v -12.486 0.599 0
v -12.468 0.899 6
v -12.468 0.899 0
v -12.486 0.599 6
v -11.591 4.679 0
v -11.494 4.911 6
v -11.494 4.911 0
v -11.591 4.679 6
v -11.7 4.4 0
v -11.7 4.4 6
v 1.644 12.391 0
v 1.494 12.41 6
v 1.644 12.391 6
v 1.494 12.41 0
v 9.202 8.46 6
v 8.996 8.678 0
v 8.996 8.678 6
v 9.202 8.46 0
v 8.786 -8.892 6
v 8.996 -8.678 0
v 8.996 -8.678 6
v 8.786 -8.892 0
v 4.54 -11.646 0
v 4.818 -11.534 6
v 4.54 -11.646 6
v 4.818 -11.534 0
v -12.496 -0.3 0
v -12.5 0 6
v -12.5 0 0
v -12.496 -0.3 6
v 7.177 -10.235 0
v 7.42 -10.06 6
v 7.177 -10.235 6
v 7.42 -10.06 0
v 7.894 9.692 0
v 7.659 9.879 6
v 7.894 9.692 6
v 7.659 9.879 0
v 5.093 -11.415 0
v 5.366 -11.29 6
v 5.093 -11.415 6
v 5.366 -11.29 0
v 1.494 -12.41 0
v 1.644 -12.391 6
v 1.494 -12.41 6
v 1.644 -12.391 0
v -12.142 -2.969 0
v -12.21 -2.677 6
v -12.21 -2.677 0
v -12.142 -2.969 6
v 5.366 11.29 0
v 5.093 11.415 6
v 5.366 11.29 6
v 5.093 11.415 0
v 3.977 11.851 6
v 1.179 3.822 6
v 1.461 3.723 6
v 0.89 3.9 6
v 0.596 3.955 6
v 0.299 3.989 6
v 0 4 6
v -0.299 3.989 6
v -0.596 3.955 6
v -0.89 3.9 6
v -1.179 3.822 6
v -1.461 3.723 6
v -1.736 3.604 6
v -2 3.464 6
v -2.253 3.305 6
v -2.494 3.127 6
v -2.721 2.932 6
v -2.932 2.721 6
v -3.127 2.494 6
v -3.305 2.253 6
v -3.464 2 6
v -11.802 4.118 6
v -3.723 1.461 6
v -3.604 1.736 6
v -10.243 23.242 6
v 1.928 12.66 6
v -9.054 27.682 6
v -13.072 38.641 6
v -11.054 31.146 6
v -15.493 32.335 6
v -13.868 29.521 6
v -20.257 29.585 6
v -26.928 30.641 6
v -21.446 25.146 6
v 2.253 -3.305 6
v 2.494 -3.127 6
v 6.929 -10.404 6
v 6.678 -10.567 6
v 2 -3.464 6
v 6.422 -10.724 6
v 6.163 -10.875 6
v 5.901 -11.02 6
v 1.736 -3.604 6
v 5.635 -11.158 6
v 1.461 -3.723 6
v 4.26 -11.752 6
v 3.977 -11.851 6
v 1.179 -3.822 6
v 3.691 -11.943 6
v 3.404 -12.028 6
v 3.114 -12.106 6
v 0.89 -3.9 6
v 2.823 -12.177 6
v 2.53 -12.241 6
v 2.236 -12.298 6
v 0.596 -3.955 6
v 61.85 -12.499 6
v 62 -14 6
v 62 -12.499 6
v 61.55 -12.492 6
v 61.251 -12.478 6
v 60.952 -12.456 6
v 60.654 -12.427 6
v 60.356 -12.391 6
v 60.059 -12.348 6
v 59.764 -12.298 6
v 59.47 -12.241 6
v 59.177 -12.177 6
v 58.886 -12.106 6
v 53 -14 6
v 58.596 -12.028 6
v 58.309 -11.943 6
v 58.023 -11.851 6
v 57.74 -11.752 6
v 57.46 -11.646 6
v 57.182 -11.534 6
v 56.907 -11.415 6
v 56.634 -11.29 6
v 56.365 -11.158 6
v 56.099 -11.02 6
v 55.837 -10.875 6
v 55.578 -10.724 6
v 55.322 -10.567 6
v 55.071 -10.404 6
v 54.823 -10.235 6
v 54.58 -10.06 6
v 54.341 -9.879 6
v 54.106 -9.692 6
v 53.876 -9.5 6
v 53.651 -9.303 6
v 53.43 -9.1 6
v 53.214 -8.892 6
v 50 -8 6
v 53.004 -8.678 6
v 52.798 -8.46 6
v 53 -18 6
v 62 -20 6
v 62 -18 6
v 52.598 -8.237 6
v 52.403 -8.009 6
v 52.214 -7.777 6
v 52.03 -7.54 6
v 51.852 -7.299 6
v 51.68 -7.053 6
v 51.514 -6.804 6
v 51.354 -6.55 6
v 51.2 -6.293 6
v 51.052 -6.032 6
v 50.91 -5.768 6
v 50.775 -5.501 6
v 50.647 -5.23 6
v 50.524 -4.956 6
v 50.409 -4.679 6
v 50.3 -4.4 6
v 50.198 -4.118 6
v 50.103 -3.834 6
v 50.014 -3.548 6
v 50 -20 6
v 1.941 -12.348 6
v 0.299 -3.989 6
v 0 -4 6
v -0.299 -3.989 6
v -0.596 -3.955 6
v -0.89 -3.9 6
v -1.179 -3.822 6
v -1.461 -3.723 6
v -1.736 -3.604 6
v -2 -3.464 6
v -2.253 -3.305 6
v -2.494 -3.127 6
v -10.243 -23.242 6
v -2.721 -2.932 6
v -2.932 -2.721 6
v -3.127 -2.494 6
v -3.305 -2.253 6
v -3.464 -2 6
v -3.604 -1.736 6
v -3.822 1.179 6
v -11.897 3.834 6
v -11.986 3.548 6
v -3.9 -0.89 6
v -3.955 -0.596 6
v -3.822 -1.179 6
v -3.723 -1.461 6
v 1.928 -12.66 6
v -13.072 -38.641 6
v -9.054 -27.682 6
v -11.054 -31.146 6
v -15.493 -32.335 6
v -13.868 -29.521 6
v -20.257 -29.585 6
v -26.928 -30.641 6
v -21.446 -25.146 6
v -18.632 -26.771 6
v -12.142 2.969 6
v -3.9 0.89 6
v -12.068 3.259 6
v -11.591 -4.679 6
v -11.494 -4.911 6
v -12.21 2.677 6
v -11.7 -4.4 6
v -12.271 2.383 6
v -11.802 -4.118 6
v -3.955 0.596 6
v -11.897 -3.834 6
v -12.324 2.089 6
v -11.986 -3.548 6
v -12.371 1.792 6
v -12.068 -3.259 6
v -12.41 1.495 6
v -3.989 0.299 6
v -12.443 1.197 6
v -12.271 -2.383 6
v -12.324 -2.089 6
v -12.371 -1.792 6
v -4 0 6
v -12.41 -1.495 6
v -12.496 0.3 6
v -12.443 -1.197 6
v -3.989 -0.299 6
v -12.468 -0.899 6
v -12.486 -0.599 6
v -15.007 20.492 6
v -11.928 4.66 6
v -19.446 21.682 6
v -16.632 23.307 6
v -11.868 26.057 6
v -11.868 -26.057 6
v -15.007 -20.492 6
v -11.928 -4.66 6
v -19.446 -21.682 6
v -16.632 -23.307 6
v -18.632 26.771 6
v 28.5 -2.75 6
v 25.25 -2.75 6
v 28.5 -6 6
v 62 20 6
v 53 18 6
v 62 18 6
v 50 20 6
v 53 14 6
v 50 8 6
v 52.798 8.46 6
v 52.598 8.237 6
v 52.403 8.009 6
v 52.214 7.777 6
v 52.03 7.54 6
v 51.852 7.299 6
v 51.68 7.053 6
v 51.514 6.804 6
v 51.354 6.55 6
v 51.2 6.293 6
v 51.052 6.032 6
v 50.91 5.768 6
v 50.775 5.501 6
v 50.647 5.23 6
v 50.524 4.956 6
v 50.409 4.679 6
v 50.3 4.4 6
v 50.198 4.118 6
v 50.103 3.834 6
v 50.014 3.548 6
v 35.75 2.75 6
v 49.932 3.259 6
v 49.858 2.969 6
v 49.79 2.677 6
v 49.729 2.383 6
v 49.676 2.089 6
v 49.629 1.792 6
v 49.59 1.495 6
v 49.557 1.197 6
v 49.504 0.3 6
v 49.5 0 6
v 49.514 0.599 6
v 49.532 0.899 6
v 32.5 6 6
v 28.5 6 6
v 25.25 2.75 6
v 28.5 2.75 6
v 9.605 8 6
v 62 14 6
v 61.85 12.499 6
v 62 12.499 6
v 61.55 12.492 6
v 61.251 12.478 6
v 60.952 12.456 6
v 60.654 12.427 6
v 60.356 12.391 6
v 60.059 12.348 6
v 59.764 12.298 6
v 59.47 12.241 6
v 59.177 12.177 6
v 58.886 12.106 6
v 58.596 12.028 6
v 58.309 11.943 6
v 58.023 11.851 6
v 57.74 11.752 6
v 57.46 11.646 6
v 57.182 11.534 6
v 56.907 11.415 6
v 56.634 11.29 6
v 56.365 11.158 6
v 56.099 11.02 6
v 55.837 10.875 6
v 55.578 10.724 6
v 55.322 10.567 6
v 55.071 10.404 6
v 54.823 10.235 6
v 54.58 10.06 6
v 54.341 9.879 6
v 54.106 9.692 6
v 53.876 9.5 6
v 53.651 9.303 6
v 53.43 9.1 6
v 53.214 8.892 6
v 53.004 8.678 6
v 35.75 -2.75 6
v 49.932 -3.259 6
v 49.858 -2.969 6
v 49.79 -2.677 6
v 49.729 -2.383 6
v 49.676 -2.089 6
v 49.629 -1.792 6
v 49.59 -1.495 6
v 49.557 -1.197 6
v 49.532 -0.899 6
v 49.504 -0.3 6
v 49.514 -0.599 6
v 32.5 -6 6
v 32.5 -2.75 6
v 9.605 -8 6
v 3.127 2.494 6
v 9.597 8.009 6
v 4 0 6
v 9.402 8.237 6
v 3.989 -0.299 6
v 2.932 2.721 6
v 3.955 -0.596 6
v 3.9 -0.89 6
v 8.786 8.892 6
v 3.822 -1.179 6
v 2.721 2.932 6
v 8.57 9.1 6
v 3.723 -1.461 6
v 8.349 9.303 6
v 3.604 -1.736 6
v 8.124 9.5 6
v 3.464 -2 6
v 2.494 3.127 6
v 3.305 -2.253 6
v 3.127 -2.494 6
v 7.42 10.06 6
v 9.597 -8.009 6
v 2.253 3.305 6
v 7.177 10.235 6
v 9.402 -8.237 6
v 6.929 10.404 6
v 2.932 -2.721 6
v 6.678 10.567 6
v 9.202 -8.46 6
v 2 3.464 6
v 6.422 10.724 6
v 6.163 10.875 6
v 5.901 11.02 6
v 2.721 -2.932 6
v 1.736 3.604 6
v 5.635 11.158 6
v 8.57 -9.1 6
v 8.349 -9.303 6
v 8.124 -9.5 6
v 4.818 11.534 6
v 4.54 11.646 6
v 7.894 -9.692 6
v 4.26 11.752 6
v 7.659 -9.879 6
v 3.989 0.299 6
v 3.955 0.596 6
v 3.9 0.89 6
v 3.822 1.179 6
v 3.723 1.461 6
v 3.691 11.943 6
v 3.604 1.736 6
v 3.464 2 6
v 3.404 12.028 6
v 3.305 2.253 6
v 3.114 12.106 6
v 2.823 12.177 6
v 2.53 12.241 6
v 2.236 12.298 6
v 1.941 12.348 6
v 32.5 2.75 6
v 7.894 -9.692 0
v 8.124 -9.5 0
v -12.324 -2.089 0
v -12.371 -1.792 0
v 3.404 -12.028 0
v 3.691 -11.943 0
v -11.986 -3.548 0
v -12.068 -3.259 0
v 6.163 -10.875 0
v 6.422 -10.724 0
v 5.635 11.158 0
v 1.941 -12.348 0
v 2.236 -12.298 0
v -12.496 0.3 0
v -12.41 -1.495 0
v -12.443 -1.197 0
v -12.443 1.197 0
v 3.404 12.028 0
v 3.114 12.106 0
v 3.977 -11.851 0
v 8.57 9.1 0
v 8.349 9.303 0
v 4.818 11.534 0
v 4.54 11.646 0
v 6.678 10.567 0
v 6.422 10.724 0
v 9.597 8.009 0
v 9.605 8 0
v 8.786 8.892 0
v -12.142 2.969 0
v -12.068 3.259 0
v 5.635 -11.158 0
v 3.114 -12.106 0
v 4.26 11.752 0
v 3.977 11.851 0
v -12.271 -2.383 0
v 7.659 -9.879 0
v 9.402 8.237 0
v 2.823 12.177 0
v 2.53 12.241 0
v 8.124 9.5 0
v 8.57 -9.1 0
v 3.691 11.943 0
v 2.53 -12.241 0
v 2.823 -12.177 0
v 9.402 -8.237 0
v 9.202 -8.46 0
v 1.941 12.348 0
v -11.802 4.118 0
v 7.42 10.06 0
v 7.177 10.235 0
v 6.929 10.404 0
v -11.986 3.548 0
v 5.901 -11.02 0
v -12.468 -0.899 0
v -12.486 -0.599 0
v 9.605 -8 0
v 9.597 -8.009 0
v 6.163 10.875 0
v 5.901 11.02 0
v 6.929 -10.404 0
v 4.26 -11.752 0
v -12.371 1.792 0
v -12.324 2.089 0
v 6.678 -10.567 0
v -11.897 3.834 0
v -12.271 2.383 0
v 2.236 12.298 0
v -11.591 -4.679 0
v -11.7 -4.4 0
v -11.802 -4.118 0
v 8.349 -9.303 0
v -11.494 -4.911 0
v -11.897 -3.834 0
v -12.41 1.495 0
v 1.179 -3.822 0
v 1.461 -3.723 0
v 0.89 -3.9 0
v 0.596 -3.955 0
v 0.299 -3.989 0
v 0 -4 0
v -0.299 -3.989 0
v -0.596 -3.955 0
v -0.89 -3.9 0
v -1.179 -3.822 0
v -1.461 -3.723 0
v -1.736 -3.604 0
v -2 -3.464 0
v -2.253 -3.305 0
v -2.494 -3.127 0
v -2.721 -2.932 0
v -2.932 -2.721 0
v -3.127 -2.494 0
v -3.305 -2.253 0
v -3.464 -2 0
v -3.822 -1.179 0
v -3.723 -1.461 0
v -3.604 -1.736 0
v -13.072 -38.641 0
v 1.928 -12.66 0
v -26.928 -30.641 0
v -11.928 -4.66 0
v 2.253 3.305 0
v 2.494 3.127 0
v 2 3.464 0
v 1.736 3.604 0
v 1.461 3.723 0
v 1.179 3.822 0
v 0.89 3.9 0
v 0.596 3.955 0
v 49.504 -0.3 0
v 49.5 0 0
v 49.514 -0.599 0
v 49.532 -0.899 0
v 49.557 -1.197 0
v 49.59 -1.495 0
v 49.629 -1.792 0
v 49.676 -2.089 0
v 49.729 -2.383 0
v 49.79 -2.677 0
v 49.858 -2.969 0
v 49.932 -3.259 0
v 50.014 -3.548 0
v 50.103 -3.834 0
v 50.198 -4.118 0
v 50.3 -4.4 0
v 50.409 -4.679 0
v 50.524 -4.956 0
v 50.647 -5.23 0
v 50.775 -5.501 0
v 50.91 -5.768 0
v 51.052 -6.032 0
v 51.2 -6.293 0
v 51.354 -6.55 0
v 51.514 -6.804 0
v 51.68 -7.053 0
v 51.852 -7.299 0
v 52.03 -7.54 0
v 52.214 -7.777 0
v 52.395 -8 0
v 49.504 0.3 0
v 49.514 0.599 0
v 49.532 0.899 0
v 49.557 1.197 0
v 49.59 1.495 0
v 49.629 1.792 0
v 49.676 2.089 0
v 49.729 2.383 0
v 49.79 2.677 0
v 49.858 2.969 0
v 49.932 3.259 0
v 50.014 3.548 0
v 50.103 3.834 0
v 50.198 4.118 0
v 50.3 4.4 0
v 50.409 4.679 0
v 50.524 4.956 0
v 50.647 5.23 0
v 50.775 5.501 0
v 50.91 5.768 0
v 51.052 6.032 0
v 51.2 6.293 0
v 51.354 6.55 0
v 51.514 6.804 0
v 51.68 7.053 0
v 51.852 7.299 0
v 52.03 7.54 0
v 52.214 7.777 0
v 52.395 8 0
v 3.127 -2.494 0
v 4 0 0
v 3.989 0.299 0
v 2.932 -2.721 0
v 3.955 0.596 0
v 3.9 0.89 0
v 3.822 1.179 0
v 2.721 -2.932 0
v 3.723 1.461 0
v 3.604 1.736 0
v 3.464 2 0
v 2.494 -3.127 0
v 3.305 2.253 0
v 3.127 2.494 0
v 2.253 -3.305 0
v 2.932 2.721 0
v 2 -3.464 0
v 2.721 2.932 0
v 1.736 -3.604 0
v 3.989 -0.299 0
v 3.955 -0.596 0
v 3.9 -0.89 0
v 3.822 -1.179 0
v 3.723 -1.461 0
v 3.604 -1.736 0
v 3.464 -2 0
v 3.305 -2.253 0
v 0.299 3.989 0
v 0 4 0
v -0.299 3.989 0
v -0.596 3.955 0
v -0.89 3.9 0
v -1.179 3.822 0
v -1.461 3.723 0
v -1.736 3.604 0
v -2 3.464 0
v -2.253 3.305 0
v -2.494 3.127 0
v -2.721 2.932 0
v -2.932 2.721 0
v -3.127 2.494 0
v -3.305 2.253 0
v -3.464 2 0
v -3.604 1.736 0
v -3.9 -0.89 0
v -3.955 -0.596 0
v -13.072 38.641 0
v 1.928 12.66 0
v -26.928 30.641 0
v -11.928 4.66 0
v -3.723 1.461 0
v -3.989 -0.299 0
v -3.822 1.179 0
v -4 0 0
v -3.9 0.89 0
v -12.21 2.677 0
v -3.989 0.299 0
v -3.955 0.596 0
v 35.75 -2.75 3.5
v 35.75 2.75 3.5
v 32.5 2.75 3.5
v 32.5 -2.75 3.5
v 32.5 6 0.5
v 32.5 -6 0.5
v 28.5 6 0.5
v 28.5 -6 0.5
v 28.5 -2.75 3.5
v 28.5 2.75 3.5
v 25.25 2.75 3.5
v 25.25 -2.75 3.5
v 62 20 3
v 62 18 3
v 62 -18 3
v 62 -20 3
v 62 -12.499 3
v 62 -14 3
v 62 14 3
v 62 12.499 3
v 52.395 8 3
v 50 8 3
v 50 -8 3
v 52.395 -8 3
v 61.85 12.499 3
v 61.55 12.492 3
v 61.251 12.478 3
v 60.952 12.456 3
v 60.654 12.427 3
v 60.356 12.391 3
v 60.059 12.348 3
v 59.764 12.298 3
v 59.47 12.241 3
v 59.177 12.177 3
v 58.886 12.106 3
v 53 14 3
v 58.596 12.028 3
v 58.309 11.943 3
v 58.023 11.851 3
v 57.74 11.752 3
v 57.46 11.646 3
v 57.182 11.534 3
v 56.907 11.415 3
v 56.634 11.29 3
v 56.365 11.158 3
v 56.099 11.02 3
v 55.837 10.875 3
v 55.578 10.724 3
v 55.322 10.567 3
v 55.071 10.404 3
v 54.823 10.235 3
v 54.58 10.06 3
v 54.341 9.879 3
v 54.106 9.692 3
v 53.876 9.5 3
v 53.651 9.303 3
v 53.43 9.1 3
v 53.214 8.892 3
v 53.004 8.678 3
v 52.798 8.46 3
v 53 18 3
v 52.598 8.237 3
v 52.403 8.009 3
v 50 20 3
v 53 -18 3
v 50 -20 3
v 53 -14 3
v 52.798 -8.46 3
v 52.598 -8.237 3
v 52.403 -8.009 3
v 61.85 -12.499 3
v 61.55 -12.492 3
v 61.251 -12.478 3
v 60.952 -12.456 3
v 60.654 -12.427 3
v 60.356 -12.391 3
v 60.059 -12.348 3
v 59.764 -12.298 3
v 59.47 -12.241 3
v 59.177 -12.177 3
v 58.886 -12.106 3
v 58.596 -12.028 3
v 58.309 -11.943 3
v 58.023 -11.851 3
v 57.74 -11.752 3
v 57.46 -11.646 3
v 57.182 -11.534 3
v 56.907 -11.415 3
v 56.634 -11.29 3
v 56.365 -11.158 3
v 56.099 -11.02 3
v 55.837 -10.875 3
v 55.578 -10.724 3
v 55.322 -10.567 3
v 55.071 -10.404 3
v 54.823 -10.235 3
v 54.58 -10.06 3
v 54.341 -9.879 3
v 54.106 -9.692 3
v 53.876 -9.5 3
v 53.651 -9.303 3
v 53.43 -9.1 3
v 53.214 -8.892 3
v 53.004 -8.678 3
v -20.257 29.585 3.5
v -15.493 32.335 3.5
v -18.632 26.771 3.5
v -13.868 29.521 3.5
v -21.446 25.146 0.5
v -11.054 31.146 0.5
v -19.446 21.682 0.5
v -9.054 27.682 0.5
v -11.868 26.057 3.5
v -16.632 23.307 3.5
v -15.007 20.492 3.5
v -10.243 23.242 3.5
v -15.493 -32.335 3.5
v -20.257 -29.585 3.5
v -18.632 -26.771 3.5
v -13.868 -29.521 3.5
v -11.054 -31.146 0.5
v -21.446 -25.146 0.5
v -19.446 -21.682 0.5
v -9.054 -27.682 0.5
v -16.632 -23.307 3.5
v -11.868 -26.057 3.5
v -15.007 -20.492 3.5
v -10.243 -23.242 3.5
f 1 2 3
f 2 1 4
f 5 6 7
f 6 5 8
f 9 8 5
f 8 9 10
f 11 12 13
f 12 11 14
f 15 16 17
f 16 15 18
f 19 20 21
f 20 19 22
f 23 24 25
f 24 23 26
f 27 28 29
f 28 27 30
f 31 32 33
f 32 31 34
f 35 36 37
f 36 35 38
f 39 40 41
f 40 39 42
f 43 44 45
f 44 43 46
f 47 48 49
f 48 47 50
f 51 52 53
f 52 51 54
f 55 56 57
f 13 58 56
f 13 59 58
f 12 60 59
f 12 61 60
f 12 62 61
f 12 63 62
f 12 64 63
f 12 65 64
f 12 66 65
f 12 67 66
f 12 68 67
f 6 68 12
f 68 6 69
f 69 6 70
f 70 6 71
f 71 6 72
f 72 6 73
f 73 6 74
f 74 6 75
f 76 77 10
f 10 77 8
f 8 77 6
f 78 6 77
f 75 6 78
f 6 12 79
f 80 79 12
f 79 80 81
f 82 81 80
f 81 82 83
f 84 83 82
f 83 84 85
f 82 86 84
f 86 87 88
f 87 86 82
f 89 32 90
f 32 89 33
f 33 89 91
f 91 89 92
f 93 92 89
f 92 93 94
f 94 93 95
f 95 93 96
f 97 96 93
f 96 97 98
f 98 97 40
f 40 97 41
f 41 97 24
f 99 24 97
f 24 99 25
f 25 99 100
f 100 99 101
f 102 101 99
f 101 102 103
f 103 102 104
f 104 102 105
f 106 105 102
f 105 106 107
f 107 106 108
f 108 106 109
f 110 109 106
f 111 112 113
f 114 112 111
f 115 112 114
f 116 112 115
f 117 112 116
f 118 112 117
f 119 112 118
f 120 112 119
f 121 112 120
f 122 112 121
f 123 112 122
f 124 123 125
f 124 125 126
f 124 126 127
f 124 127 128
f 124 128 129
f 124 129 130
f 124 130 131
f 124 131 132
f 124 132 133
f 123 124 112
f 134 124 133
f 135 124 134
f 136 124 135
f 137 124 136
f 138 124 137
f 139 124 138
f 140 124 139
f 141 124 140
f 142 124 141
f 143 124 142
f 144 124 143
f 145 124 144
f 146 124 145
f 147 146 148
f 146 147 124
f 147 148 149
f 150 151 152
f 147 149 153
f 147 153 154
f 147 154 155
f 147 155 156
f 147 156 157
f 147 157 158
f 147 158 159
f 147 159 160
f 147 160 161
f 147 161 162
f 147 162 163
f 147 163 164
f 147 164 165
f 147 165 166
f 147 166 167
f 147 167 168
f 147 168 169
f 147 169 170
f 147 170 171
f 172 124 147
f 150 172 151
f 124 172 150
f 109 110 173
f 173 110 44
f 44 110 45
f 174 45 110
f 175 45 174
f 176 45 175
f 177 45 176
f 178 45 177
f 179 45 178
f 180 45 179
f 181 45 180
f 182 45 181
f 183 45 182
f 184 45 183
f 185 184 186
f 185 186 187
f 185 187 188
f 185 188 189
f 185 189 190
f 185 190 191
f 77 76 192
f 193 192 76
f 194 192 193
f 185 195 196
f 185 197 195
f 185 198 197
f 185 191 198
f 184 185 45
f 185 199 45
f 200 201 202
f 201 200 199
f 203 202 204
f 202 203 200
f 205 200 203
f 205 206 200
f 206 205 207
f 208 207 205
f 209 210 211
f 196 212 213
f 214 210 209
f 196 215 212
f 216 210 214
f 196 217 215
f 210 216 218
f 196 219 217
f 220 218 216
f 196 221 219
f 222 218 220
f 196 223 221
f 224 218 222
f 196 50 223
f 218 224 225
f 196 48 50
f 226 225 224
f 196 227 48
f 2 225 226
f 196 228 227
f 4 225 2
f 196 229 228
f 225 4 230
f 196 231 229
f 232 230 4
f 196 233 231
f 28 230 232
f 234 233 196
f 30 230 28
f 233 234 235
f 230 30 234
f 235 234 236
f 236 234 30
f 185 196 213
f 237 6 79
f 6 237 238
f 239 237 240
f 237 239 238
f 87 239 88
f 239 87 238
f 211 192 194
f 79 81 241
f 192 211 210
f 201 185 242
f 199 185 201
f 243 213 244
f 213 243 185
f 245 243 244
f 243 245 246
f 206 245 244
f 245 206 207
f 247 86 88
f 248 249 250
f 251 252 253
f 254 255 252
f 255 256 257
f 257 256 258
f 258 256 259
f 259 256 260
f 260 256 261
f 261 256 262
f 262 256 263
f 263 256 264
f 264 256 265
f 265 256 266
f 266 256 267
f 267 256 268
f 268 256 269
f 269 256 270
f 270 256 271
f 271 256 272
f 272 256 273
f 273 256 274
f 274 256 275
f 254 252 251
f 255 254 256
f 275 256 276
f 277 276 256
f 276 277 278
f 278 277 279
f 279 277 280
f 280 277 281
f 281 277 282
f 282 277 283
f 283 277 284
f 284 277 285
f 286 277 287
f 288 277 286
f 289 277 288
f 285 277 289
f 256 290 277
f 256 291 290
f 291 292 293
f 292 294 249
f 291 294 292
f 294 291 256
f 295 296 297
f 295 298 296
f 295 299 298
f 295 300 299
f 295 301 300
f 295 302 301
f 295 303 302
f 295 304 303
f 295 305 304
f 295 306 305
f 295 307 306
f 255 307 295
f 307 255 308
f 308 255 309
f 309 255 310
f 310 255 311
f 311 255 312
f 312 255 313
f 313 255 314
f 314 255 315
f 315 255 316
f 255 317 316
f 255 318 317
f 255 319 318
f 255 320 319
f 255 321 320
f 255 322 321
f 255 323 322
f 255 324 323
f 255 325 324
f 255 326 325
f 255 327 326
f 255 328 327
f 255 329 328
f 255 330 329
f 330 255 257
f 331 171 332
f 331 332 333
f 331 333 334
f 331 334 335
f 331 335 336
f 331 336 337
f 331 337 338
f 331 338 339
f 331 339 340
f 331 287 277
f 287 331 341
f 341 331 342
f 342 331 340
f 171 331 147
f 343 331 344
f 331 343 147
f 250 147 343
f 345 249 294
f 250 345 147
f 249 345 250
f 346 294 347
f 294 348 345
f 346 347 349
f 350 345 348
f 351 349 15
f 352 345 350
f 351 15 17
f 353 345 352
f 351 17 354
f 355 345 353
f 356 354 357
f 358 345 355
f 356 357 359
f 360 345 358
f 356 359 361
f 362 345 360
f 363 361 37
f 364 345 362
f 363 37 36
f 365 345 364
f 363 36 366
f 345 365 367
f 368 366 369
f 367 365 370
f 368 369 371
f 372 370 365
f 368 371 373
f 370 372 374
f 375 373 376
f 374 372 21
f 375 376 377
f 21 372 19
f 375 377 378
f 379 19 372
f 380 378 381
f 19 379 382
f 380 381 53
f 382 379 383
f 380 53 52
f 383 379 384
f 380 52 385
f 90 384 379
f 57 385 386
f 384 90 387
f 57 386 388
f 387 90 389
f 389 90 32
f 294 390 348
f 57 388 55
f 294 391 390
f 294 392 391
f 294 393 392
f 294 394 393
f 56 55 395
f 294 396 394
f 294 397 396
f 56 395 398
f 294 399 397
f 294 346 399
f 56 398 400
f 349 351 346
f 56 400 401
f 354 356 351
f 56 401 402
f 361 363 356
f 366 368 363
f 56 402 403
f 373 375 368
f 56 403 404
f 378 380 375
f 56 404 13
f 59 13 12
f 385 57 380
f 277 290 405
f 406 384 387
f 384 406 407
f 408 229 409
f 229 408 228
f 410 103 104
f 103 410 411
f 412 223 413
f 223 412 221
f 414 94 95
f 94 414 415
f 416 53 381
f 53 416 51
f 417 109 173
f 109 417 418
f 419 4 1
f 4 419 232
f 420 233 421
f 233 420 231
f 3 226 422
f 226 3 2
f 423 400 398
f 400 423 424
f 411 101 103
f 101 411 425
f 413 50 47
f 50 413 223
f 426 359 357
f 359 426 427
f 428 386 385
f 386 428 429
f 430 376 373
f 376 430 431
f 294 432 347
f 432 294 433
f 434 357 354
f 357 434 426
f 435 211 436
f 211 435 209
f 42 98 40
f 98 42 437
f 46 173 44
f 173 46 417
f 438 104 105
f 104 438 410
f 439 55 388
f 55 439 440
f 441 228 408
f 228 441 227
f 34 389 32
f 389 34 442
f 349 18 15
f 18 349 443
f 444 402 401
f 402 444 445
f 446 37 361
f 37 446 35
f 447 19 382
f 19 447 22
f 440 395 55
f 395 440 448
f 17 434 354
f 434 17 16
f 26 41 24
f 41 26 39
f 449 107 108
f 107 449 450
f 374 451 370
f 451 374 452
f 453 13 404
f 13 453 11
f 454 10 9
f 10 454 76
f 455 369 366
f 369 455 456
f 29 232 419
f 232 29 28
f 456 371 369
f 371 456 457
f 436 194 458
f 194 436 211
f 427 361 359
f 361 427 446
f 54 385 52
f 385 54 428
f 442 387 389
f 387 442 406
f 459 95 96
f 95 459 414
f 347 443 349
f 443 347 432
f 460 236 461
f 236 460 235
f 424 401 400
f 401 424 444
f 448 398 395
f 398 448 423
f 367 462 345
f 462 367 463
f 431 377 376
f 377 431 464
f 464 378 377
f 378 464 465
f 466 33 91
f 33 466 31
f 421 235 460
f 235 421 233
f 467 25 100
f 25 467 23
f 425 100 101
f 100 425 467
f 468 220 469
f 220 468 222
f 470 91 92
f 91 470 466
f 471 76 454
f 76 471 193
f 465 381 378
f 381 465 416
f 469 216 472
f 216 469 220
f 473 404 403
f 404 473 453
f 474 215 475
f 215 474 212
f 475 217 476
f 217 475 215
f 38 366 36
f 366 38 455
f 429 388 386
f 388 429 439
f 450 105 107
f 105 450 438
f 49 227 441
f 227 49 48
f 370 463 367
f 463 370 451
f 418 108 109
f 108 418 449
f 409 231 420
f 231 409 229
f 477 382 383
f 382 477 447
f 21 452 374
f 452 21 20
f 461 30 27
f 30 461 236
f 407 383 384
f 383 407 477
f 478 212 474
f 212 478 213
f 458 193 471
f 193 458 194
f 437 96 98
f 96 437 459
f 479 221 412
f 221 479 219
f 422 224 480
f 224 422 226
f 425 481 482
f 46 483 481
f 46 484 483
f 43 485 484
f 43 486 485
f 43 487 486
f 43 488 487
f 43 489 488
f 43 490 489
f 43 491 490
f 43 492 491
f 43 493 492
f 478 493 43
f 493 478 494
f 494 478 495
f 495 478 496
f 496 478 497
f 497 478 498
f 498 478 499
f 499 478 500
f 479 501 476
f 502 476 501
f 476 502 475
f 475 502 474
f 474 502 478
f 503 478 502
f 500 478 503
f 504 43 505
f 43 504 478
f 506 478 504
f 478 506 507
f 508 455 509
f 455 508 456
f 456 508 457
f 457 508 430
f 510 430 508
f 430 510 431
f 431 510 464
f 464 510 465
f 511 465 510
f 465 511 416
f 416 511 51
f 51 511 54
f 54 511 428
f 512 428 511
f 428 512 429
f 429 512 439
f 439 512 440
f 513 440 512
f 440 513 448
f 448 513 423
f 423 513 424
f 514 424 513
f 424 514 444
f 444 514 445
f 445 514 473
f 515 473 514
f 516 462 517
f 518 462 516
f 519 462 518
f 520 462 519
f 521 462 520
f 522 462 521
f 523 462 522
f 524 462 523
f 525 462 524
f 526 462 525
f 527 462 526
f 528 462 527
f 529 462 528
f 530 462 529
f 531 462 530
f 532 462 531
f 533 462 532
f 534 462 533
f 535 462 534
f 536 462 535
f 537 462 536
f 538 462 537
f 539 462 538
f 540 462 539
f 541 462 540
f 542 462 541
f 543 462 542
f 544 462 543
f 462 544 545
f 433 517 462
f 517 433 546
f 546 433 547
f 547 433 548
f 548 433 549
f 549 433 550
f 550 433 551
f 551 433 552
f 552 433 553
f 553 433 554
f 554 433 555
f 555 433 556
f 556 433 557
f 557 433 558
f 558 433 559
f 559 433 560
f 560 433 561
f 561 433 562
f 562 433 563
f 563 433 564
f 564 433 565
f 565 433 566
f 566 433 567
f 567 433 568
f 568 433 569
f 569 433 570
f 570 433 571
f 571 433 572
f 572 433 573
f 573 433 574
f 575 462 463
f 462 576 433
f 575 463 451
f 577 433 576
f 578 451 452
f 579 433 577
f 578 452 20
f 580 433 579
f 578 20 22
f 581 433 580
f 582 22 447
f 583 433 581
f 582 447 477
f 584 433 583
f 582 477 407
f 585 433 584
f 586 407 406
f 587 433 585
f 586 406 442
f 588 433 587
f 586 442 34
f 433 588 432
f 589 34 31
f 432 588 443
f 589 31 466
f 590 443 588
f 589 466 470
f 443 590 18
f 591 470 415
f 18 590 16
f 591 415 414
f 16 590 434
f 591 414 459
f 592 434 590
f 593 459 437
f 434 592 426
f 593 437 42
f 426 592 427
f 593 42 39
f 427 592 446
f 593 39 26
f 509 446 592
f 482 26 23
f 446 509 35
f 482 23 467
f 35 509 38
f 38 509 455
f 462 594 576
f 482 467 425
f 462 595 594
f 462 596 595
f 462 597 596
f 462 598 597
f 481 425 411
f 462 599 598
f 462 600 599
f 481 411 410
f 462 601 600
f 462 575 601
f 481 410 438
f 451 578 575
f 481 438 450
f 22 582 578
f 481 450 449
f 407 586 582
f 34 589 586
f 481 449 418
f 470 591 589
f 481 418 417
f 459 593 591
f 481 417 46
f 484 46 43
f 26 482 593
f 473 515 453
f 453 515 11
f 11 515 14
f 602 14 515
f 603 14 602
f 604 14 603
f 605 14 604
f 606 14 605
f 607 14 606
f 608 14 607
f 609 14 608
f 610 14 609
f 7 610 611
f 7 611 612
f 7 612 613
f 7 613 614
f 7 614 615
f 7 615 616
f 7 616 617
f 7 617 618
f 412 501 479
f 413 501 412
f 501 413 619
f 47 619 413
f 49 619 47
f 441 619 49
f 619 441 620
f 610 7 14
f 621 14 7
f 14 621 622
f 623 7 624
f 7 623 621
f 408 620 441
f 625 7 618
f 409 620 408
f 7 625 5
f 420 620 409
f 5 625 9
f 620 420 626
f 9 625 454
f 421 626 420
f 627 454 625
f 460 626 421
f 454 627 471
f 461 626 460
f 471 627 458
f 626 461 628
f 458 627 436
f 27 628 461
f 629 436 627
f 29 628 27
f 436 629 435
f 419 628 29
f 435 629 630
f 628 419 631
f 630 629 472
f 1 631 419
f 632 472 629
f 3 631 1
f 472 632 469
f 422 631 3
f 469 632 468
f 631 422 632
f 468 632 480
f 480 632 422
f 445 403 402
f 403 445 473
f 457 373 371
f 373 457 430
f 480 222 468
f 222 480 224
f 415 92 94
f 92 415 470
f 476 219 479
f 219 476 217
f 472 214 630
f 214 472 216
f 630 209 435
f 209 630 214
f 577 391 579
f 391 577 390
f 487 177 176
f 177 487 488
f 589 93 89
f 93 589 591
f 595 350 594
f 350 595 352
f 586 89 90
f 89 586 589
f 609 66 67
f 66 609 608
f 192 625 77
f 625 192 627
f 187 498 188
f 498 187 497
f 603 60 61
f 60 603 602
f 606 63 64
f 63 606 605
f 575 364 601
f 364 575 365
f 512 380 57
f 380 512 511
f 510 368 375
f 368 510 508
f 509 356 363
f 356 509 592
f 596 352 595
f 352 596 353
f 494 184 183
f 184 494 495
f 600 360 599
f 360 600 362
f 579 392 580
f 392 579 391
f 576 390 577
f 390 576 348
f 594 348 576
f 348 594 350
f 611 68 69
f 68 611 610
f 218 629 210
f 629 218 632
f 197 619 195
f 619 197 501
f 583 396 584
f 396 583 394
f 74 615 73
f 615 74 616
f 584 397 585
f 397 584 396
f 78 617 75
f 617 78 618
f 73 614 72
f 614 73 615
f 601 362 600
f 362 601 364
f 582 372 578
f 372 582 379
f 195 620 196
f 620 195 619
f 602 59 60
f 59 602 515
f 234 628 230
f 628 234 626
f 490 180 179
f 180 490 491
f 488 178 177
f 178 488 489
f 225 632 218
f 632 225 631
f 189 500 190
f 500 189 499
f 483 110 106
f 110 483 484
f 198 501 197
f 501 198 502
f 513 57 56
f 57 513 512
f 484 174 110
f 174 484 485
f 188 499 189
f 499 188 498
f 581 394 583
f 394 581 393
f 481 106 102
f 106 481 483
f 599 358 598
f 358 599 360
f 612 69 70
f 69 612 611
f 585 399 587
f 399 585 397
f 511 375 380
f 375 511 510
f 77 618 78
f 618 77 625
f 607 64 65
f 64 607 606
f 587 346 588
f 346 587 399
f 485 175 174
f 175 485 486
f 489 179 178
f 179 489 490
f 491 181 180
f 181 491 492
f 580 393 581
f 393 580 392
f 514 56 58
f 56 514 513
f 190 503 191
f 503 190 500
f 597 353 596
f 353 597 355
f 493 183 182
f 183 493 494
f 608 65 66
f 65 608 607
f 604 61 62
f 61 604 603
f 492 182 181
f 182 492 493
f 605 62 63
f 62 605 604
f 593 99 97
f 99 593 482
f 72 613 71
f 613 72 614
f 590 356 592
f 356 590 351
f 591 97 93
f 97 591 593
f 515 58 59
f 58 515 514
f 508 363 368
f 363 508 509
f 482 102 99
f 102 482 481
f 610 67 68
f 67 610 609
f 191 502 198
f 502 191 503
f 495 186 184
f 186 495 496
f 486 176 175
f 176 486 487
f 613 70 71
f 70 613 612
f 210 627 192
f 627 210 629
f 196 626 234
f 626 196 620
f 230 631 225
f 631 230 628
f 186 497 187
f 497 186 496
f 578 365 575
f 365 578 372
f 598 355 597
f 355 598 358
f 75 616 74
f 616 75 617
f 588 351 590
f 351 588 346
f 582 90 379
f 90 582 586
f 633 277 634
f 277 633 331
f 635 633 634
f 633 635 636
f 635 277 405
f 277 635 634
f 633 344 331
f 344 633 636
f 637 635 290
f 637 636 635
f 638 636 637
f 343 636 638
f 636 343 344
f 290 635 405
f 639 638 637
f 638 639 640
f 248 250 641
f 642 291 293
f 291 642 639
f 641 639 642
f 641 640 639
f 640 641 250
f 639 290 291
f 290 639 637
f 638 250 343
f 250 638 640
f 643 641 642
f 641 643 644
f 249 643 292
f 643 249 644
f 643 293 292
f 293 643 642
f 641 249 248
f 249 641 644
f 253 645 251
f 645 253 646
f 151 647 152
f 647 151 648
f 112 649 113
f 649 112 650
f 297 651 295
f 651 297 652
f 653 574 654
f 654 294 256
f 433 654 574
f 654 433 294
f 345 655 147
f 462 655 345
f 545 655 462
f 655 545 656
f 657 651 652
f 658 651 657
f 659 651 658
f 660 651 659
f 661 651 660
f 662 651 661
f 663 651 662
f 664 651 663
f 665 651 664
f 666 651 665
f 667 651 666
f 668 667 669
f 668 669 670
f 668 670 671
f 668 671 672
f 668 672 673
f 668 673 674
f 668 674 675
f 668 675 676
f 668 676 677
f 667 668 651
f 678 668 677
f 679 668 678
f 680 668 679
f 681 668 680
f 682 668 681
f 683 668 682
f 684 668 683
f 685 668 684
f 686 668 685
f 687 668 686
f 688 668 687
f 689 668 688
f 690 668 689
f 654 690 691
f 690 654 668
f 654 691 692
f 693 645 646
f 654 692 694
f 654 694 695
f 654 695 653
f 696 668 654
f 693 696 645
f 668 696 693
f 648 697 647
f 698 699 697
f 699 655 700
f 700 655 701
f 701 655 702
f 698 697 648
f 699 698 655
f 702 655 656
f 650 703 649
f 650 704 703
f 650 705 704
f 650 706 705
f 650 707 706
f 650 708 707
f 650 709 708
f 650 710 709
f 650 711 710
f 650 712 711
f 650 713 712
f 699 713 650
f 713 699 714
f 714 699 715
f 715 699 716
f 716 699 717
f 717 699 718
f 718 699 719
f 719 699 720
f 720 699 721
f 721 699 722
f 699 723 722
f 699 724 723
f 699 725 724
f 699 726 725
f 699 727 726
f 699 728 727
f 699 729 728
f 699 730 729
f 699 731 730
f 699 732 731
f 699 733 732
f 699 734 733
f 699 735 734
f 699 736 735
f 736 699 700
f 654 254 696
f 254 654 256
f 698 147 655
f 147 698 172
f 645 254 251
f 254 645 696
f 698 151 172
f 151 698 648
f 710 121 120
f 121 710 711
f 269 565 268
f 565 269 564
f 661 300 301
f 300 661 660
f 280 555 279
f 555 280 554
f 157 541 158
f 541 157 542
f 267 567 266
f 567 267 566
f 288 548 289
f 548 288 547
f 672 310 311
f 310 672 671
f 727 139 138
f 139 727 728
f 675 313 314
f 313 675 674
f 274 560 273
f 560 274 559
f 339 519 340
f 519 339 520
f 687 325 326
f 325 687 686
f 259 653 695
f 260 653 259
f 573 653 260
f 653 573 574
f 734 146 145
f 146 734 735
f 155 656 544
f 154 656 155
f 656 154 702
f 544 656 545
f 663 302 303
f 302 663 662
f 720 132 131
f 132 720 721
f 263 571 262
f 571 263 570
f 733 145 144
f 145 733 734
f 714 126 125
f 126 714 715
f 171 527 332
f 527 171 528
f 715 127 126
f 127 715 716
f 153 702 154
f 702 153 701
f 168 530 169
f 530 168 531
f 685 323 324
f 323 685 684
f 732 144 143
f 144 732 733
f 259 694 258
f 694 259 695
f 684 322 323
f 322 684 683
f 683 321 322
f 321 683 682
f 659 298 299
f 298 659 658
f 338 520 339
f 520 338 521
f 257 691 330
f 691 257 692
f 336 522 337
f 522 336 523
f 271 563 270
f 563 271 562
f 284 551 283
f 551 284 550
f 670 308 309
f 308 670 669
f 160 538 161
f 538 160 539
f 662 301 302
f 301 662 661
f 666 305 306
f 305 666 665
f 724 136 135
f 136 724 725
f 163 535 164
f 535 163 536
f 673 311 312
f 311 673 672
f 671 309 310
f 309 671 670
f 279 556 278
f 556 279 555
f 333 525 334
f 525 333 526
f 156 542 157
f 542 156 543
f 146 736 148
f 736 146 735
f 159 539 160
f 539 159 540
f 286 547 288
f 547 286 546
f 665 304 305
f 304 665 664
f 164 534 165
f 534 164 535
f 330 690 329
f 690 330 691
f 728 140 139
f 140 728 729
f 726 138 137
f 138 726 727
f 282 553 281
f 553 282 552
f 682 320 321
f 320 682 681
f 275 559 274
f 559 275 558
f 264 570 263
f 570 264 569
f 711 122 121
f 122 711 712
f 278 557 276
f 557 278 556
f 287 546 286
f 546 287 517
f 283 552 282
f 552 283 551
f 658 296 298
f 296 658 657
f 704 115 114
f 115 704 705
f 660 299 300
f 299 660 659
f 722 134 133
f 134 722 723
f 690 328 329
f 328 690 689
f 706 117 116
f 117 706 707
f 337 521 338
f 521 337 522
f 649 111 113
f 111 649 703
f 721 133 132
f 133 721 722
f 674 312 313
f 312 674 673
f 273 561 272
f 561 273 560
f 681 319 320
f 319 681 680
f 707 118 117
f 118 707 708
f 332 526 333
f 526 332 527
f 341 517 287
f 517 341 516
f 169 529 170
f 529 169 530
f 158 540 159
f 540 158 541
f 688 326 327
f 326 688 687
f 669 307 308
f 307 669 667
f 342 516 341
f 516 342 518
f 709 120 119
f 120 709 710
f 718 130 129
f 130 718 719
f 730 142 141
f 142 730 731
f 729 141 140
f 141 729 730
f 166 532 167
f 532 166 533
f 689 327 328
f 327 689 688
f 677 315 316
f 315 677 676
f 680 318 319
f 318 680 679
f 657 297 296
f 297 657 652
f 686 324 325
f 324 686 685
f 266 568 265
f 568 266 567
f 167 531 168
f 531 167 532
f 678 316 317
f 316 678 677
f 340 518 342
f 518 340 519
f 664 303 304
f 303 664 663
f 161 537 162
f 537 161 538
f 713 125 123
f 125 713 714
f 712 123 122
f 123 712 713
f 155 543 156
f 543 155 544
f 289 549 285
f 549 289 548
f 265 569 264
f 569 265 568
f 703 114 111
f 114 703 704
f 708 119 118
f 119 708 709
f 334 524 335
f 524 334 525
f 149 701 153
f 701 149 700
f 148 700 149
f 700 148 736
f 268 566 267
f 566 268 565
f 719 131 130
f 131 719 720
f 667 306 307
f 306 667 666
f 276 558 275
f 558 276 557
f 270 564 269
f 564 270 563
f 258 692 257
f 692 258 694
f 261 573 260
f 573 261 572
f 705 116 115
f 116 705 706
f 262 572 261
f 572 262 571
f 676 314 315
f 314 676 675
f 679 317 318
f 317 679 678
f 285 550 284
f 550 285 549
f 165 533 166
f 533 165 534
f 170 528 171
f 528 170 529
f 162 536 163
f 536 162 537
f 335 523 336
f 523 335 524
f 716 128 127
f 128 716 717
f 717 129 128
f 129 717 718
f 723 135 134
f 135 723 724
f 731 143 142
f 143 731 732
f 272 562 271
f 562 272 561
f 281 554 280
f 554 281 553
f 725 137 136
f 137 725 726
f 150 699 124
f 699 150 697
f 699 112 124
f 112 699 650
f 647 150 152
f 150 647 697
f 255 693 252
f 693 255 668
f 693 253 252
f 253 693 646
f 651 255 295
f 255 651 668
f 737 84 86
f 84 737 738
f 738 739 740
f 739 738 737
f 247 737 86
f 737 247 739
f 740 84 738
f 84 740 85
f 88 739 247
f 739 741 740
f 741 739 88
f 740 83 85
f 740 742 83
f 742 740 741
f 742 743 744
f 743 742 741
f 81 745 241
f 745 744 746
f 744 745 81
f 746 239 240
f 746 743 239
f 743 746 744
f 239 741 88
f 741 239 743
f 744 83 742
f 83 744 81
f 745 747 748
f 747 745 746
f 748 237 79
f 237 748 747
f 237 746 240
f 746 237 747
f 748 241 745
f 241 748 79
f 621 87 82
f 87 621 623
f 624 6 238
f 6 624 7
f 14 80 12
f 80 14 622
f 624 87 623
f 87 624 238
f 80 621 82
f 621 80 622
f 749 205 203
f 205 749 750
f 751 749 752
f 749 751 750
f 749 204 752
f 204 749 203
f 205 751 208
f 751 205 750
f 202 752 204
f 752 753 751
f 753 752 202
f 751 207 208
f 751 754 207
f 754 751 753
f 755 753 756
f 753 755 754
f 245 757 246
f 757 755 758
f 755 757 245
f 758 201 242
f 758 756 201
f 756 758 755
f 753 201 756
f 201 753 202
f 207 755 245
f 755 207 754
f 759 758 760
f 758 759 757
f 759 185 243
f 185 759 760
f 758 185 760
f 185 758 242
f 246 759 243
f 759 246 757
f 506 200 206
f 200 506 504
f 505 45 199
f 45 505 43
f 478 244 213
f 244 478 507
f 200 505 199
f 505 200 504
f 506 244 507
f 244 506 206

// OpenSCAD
$fa = .3;	// minimum angle 
$fs = .3;	// minimum size
difference(){
    cylinder(h=6,d=25);
    cylinder(h=15,d=8,center=true);
}
rotate([0,0,0]) translate([34,0,3]){
    difference(){ 
        union(){
            difference(){
                cube([56,16,6], center=true);
                rotate([0,0,0])translate([-3.5,0,3.5])screwshadow();
            }
            translate([22,0,1.5])cube([12,40,3],center=true);
        }
        translate([28,0,0])cylinder(h=15,d=25,center=true);
        translate([25,-16,0])cube([12,4,12],center=true);
        translate([25,16,0])cube([12,4,12],center=true);
    }
}
rotate([0,0,120]) translate([25,0,3]){
    difference(){
        cube([30,16,6], center=true);
        rotate([0,0,0])translate([5.5,0,3.5])screwshadow();
    }
}
rotate([0,0,240]) translate([25,0,3]){
    difference(){
        cube([30,16,6], center=true);
        rotate([0,0,0])translate([5.5,0,3.5])screwshadow();
    }
}

//screwshadow();

module screwshadow(){
    translate([3.5,0,3])cube([3.5,5.5,12], center=true);
    translate([0,0,0])cube([4,12,12], center=true);
    translate([-3.5,0,3])cube([3.5,5.5,12], center=true);
}
